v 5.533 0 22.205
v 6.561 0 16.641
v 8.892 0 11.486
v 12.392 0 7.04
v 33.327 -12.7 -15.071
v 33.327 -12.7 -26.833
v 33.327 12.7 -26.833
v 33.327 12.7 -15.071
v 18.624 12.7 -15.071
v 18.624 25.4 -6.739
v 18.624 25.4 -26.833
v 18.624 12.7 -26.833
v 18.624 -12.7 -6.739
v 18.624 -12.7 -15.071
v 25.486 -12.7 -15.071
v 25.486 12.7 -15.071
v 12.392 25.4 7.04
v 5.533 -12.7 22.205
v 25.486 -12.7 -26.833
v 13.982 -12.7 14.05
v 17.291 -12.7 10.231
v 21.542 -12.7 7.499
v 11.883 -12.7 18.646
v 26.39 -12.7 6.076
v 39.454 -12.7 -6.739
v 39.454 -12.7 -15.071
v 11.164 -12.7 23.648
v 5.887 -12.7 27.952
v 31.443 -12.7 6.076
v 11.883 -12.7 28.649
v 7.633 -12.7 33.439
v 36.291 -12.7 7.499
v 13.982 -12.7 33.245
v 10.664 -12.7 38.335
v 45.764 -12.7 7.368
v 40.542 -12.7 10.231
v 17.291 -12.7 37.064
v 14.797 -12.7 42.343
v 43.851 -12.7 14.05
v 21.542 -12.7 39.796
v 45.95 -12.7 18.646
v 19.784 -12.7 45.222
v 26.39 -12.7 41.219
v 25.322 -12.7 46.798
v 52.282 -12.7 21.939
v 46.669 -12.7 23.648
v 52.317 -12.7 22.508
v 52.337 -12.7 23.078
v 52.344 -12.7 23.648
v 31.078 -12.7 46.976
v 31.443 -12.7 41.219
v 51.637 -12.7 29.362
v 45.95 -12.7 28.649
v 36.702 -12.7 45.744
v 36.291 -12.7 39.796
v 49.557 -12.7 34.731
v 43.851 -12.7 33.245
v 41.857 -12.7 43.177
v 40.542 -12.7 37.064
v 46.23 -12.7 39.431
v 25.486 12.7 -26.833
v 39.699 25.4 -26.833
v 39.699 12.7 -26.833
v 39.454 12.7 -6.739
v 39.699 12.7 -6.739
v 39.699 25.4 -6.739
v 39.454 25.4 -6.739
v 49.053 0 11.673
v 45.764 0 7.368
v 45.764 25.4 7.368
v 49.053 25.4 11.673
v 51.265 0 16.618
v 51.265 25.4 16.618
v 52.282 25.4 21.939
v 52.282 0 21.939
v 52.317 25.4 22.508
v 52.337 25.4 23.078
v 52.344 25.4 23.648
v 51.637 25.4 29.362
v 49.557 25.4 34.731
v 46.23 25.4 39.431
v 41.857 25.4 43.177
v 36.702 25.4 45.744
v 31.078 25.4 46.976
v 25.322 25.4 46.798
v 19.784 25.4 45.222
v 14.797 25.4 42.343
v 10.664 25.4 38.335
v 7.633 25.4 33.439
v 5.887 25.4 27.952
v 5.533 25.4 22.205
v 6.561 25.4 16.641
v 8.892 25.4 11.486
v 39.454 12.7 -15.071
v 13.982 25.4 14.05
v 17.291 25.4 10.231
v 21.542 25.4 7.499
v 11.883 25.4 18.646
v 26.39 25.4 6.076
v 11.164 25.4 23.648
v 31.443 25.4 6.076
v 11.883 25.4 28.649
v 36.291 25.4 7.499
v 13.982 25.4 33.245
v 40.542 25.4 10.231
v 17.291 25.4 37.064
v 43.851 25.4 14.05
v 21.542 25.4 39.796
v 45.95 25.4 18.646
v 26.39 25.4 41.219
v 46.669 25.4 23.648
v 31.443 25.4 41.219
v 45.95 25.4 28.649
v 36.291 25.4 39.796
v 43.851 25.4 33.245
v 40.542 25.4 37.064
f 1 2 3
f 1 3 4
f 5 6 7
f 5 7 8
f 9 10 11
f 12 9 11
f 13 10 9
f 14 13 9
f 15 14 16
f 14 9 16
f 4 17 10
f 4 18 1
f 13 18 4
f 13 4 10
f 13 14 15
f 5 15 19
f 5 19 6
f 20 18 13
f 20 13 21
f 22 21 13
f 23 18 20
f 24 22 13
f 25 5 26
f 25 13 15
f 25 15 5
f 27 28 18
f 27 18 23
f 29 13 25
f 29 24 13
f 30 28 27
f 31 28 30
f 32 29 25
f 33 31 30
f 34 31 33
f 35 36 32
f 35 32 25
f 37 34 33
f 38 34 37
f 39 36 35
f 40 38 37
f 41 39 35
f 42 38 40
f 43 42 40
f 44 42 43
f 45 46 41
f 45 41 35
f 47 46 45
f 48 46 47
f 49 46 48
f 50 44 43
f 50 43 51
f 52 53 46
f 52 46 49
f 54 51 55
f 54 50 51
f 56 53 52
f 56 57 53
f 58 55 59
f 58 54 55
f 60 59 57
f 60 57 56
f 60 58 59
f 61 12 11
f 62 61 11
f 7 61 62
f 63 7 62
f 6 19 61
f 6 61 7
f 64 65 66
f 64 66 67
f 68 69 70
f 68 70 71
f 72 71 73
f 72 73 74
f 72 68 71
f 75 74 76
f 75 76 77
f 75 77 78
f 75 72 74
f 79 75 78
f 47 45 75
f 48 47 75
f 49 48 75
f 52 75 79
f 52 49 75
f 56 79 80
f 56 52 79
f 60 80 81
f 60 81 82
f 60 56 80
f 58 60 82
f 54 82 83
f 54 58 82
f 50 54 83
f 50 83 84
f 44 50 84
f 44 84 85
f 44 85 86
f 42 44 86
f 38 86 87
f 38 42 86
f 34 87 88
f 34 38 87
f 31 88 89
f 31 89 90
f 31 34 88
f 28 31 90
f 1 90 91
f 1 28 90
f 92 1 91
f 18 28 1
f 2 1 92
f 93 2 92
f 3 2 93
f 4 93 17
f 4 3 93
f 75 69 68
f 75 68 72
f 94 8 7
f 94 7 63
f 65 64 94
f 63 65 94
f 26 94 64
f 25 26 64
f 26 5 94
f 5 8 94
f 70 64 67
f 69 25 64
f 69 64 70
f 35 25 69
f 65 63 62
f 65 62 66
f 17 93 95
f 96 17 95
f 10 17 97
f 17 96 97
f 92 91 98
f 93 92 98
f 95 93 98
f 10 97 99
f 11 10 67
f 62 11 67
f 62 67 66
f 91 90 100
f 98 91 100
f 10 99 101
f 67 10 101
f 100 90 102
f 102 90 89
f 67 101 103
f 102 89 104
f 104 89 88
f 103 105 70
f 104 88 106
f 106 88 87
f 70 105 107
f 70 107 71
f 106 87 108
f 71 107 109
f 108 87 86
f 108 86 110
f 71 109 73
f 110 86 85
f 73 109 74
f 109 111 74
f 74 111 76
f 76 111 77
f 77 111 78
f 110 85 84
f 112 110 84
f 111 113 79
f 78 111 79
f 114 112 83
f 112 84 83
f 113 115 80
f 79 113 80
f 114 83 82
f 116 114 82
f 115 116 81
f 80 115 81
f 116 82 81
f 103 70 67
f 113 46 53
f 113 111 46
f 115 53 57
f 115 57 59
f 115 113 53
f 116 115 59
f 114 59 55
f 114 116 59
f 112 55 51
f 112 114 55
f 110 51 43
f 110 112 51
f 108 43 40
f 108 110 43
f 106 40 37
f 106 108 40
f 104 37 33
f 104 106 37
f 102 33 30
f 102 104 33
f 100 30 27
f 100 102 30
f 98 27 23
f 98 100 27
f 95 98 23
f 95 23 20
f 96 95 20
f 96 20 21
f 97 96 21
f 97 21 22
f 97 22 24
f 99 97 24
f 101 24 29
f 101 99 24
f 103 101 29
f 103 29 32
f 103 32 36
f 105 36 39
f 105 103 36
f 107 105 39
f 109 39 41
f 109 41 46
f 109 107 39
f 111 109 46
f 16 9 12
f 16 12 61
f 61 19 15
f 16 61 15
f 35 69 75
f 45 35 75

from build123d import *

# Parameters (mm, degrees)
F0_R          = 17.7524356155
F0_W          = 7.8417137265
F0_H          = 11.7625724524
F1_DEPTH      = 12.7
F0_W_2        = 6.861500442
F2_DEPTH      = 12.7
F3_DEPTH      = 12.7
F4_DEPTH      = 12.7
F5_DEPTH      = 12.7
F5_DEPTH_BACK = 12.7


with BuildPart() as f1:
    # F0 (on Front) → F1 (new body)
    with BuildSketch(Plane.XZ):
        with BuildLine():
            ThreePointArc((52.2818670696, 21.9389039537), (52.3286615447, 22.7927192156), (52.3442666326, 23.6476734281))
            ThreePointArc((52.3442666326, 23.6476734281), (28.1944509327, 47.0644925256), (5.5328658292, 22.2046136927))
            Line((5.5328658292, 22.2046136927), (12.3917076344, 7.0402779271))
            ThreePointArc((12.3917076344, 7.0402779271), (29.1464973283, 0.2208610805), (45.764060769, 7.3681689029))
            Line((45.764060769, 7.3681689029), (52.2818670696, 21.9389039537))
        make_face()
        with Locations((28.9163235575, 23.6476734281)):
            Circle(F0_R, mode=Mode.SUBTRACT)
        with BuildLine():
            ThreePointArc((45.764060769, 7.3681689029), (29.1464973283, 0.2208610805), (12.3917076344, 7.0402779271))
            Line((12.3917076344, 7.0402779271), (18.6240747571, -6.7389737815))
            Line((18.6240747571, -6.7389737815), (39.4536294043, -6.7389737815))
            Line((39.4536294043, -6.7389737815), (45.764060769, 7.3681689029))
        make_face()
        Polygon((39.4536294043, -6.7389737815), (18.6240747571, -6.7389737815), (18.6240747571, -15.0707960129), (25.4855751991, -15.0707960129), (33.3272889256, -15.0707960129), (39.4536294043, -15.0707960129), align=None)
        with Locations((29.4064320624, -20.9520822391)):
            Rectangle(F0_W, F0_H)
    extrude(amount=F1_DEPTH)

    # F0 (on Front) → F2 (join)
    with BuildSketch(Plane.XZ):
        with BuildLine():
            ThreePointArc((52.2818670696, 21.9389039537), (52.3286615447, 22.7927192156), (52.3442666326, 23.6476734281))
            ThreePointArc((52.3442666326, 23.6476734281), (28.1944509327, 47.0644925256), (5.5328658292, 22.2046136927))
            Line((5.5328658292, 22.2046136927), (12.3917076344, 7.0402779271))
            ThreePointArc((12.3917076344, 7.0402779271), (29.1464973283, 0.2208610805), (45.764060769, 7.3681689029))
            Line((45.764060769, 7.3681689029), (52.2818670696, 21.9389039537))
        make_face()
        with Locations((28.9163235575, 23.6476734281)):
            Circle(F0_R, mode=Mode.SUBTRACT)
        with BuildLine():
            Line((12.3917076344, 7.0402779271), (5.5328658292, 22.2046136927))
            ThreePointArc((5.5328658292, 22.2046136927), (7.5702968676, 13.992847625), (12.3917076344, 7.0402779271))
        make_face()
        with BuildLine():
            ThreePointArc((45.764060769, 7.3681689029), (50.3021498595, 14.0813287702), (52.2818670696, 21.9389039537))
            Line((52.2818670696, 21.9389039537), (45.764060769, 7.3681689029))
        make_face()
        with BuildLine():
            ThreePointArc((45.764060769, 7.3681689029), (29.1464973283, 0.2208610805), (12.3917076344, 7.0402779271))
            Line((12.3917076344, 7.0402779271), (18.6240747571, -6.7389737815))
            Line((18.6240747571, -6.7389737815), (39.4536294043, -6.7389737815))
            Line((39.4536294043, -6.7389737815), (45.764060769, 7.3681689029))
        make_face()
        Polygon((39.4536294043, -6.7389737815), (18.6240747571, -6.7389737815), (18.6240747571, -15.0707960129), (25.4855751991, -15.0707960129), (33.3272889256, -15.0707960129), (39.4536294043, -15.0707960129), align=None)
        Polygon((39.6986864507, -6.7389737815), (39.4536294043, -6.7389737815), (39.4536294043, -15.0707960129), (33.3272889256, -15.0707960129), (33.3272889256, -26.8333684653), (39.6986864507, -26.8333684653), align=None)
        with Locations((22.0548249781, -20.9520822391)):
            Rectangle(F0_W_2, F0_H)
        with Locations((29.4064320624, -20.9520822391)):
            Rectangle(F0_W, F0_H)
    extrude(amount=-F2_DEPTH)

    # F3 (add): a face of the model
    f3_faces = [f1.faces().sort_by_distance(p)[0] for p in [
        (28.6947474354, 12.7, 46.1994273244),
    ]]
    extrude(f3_faces, amount=F3_DEPTH)

    # F4 (add): faces of the model
    f4_faces = [f1.faces().sort_by_distance(p)[0] for p in [
        (36.5942272767, 0, -20.6856164164),
        (22.0548249781, 0, -20.9520822391),
    ]]
    extrude(f4_faces, amount=-F4_DEPTH)

    # F5 (cut, two sides): faces of the model
    f5_faces = [f1.faces().sort_by_distance(p)[0] for p in [
        (36.5942272767, 0, -20.6856164164),
        (22.0548249781, 0, -20.9520822391),
    ]]
    extrude(f5_faces, amount=F5_DEPTH, mode=Mode.SUBTRACT)
    extrude(f5_faces, amount=-F5_DEPTH_BACK, mode=Mode.SUBTRACT)


solid = f1.part
